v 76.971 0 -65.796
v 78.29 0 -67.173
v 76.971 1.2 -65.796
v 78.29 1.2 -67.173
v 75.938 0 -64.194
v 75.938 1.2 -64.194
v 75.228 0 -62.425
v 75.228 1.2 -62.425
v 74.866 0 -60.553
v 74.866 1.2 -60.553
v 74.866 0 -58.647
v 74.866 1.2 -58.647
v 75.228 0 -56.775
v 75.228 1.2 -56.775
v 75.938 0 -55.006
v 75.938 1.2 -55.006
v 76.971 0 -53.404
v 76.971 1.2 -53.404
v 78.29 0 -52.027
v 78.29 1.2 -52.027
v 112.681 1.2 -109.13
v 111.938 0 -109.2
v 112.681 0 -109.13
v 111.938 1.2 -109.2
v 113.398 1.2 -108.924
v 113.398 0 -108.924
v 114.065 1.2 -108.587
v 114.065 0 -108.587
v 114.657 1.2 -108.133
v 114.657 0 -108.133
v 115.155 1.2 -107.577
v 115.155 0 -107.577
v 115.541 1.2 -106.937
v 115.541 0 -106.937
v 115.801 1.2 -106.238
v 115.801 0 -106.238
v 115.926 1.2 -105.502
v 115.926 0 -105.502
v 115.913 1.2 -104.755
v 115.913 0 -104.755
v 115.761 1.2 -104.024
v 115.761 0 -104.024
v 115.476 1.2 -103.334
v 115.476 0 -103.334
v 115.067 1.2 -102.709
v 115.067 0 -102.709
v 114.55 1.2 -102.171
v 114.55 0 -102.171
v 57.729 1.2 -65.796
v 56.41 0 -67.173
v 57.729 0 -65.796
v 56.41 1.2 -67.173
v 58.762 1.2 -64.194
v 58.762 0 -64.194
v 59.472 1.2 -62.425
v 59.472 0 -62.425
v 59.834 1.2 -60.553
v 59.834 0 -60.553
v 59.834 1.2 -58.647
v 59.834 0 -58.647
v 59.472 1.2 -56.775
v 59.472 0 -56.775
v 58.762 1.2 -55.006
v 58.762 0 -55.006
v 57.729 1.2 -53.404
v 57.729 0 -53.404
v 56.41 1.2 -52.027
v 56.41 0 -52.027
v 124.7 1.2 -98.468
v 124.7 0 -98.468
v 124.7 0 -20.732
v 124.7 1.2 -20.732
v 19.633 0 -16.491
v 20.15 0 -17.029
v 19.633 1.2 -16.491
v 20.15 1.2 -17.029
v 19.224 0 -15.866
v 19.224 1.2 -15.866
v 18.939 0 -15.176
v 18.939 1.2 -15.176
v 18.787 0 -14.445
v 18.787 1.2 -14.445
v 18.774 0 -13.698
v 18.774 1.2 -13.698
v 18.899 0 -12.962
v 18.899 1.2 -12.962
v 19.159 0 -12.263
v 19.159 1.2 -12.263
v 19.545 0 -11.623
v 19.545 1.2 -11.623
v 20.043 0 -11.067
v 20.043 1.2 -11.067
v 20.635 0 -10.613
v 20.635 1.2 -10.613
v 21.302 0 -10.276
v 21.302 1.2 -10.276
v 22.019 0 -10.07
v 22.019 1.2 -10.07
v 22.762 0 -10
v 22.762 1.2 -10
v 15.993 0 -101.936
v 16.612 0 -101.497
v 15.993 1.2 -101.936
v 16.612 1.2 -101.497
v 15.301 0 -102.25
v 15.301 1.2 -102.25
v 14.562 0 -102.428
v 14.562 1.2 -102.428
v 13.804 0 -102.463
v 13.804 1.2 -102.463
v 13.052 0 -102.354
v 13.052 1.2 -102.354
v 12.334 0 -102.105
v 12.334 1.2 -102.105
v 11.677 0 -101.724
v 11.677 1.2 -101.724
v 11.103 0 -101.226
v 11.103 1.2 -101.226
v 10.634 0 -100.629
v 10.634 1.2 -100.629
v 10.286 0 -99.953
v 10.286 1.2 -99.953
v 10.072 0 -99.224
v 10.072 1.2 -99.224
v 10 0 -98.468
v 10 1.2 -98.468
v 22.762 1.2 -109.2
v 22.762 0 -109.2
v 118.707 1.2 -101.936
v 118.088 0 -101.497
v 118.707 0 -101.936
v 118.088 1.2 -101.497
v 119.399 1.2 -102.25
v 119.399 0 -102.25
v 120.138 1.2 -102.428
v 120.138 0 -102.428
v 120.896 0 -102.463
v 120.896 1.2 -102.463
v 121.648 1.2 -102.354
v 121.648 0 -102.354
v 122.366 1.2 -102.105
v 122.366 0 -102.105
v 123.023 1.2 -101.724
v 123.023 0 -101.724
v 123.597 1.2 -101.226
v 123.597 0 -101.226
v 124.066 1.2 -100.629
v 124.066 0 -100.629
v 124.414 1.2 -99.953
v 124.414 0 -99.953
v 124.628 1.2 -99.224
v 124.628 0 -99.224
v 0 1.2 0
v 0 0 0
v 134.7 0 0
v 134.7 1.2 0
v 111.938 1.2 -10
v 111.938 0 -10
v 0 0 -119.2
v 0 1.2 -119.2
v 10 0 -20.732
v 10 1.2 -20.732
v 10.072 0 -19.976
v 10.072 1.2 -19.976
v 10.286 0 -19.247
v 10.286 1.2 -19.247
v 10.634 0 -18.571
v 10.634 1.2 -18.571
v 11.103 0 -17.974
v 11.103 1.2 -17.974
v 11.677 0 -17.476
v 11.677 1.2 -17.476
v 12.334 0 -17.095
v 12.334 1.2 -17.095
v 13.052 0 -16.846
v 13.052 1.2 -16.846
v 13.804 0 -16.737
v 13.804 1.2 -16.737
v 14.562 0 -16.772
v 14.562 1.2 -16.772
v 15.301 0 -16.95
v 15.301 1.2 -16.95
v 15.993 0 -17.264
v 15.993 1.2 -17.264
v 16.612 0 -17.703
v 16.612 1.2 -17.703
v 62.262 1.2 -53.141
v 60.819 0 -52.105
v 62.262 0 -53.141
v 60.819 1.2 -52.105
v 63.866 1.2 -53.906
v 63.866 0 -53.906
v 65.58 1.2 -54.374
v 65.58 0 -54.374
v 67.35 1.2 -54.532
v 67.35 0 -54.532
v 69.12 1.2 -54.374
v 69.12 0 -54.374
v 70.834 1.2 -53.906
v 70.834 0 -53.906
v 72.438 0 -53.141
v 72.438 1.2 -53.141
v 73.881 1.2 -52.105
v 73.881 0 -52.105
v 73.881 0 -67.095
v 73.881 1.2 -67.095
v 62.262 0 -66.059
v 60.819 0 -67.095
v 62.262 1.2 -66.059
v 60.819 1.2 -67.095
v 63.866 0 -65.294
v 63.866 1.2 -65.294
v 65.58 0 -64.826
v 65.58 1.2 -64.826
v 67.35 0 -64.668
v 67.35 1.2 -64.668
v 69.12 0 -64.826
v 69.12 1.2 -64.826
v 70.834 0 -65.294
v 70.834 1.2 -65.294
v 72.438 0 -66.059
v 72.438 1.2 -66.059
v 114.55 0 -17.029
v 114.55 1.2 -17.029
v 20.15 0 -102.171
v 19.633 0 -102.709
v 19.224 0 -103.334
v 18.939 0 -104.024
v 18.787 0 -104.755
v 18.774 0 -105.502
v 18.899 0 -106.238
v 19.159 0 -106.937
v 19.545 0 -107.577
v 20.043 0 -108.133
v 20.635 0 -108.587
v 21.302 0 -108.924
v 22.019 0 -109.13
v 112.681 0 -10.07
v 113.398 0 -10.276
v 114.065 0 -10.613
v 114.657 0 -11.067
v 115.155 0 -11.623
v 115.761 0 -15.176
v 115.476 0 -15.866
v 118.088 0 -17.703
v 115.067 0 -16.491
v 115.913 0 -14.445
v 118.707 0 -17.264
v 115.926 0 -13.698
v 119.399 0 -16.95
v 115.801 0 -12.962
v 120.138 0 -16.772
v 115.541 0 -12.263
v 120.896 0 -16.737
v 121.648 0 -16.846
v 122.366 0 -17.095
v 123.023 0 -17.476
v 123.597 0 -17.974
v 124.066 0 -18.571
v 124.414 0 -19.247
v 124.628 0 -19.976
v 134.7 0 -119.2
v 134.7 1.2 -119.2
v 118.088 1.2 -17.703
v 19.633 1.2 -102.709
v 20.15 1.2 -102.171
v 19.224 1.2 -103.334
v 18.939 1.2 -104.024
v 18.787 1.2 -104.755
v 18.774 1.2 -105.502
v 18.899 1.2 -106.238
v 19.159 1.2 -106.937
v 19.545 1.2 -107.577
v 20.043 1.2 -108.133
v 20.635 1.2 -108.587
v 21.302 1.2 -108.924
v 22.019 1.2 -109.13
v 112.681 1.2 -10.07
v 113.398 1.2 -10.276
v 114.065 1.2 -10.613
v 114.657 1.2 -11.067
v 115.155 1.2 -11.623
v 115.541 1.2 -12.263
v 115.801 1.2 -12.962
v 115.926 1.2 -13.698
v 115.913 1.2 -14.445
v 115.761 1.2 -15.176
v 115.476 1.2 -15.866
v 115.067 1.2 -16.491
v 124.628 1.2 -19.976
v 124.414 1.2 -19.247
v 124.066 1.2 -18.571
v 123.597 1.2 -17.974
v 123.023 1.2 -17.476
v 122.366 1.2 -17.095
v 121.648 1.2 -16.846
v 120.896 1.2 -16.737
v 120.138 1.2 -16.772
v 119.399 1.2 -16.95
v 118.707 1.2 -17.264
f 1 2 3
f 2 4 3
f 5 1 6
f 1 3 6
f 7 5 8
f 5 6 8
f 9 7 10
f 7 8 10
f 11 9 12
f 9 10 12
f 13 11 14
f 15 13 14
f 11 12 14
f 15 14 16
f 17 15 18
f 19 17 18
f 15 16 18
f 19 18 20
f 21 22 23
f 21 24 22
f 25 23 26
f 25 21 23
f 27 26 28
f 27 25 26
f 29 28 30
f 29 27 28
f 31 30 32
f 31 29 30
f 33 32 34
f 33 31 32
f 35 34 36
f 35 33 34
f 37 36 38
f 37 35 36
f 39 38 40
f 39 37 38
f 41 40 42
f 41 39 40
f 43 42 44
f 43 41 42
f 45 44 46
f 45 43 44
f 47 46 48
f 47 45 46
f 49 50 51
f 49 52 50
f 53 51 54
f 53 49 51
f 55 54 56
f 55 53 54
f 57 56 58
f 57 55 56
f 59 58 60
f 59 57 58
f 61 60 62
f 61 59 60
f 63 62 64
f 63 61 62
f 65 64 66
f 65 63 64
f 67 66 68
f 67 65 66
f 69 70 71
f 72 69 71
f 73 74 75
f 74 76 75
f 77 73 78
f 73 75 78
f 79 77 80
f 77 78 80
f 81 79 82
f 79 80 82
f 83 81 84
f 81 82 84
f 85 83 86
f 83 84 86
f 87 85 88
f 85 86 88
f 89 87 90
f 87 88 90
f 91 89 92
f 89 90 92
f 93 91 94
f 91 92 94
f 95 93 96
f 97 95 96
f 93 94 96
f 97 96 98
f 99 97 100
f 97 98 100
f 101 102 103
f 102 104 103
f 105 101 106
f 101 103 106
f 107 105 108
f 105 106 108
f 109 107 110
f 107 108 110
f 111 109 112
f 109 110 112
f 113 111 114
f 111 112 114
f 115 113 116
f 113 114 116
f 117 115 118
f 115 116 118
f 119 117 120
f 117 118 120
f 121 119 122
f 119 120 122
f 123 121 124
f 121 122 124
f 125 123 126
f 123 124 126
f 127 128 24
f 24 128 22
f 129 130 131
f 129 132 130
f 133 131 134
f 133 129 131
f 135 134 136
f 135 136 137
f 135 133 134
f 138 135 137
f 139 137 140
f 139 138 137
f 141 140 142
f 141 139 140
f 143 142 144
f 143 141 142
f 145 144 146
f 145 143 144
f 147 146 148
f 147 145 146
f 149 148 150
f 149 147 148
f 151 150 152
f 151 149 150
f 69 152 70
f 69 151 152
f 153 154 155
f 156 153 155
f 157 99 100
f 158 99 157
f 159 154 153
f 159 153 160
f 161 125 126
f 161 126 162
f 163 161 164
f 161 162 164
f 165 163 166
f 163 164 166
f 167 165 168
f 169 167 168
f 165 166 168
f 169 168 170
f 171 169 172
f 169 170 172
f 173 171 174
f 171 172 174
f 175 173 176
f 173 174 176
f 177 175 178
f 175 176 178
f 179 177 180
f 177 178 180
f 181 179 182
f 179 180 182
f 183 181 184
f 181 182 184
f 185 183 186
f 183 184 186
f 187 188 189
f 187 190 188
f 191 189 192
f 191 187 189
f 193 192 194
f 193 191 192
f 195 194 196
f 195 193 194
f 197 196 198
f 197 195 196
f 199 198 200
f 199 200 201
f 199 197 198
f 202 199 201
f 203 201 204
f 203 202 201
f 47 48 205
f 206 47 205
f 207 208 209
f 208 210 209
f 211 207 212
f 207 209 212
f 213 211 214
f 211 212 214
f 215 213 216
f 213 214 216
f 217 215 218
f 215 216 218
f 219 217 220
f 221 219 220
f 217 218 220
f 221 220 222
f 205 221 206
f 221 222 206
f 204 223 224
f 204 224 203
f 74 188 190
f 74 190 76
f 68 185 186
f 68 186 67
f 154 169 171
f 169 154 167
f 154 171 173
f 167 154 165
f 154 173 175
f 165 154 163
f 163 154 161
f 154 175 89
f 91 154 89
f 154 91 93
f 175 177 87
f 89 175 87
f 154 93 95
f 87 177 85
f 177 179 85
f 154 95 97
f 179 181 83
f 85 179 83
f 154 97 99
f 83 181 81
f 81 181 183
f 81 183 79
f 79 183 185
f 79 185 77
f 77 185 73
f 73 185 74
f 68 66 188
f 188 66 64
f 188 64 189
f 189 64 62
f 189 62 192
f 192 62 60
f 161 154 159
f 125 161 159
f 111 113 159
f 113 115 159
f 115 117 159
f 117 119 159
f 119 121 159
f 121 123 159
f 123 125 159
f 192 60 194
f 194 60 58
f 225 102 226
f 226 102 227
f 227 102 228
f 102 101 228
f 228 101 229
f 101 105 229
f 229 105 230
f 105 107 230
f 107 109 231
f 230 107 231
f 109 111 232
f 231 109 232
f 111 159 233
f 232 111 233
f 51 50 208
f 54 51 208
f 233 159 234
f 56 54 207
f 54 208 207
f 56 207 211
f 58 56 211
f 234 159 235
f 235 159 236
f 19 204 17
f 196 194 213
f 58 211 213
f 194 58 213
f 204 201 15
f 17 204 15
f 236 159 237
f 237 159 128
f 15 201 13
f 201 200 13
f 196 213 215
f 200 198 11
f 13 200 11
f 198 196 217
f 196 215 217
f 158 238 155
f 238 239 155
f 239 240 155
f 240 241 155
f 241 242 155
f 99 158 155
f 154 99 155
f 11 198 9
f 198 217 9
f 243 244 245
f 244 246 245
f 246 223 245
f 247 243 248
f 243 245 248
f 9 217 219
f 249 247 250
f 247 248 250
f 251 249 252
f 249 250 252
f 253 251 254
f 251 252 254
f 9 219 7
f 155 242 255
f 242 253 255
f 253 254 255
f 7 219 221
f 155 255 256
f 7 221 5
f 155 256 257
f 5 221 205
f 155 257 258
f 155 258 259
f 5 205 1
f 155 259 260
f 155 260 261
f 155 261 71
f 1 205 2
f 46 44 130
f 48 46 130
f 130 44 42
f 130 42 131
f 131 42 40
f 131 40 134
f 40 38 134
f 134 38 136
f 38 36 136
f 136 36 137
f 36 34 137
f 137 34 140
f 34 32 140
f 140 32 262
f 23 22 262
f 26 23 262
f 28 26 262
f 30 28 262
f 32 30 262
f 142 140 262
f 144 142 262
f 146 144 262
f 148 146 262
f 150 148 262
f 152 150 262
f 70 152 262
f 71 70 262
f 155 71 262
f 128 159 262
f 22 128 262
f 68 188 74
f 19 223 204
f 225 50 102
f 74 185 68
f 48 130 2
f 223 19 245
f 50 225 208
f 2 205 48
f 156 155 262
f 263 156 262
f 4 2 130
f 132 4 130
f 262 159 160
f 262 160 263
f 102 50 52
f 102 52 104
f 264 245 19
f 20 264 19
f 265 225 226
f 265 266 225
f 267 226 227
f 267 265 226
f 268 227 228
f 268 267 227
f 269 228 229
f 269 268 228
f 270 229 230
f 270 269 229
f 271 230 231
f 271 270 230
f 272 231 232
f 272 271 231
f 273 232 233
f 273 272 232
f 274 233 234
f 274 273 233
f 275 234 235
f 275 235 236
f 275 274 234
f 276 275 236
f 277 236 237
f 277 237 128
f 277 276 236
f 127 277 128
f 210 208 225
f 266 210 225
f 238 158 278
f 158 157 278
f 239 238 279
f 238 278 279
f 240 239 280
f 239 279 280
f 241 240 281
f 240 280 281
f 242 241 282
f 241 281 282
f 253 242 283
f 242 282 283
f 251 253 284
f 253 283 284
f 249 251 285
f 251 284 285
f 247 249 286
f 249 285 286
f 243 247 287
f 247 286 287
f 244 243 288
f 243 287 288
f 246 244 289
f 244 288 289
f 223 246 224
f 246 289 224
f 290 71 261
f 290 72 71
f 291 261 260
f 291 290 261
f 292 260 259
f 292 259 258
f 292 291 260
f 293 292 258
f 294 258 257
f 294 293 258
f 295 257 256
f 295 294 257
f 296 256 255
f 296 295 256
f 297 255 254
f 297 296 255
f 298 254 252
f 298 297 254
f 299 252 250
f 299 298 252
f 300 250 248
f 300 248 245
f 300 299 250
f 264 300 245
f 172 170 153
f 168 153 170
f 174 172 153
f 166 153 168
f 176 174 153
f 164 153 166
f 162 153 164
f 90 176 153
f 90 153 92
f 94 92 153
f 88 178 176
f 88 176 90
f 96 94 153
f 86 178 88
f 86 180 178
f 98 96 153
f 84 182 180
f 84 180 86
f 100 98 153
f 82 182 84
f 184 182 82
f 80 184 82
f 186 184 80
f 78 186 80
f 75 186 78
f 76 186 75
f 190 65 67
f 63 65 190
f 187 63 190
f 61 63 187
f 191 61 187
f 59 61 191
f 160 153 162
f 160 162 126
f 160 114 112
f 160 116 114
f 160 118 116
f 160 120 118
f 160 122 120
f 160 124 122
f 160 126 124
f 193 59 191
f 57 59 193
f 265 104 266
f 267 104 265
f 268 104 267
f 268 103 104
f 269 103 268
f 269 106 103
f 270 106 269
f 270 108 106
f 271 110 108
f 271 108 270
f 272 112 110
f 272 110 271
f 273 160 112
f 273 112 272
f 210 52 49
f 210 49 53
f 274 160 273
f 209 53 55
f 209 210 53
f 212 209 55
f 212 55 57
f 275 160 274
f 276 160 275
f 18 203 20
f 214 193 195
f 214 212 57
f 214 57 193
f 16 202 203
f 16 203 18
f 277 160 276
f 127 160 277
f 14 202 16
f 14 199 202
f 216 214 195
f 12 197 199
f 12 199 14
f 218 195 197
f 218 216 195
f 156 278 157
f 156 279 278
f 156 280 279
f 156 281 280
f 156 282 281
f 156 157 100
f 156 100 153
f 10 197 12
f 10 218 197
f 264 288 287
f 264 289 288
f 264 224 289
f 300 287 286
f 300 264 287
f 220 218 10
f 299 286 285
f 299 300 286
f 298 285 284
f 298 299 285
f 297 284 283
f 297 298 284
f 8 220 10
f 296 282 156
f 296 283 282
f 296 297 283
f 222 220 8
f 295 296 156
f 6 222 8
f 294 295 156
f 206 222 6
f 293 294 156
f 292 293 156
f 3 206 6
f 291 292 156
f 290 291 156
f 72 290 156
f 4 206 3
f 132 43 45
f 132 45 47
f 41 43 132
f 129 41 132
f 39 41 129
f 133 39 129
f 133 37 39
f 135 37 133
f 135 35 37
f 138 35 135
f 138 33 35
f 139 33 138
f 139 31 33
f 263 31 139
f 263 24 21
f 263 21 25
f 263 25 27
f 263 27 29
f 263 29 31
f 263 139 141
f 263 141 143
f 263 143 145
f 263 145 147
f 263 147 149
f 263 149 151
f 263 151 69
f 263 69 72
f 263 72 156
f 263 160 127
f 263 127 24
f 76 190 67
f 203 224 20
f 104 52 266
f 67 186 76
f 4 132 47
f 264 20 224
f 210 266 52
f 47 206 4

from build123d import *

# Parameters (mm, degrees)
SKETCH1_W           = 134.7
SKETCH1_H           = 119.2
BOSS_EXTRUDE1_DEPTH = 1.2
FILLET1_R           = 10
FILLET2_R           = 4


with BuildPart() as part:
    # Sketch1 → Boss-Extrude1 (new body)
    with BuildSketch(Plane(origin=(0, 0, 0), x_dir=(1, 0, 0), z_dir=(0, 1, 0))):
        with Locations((67.35, 59.6)):
            Rectangle(SKETCH1_W, SKETCH1_H)
        Polygon((122.7, 109.2), (67.35, 61.462466726), (12, 109.2), align=None, mode=Mode.SUBTRACT)
        Polygon((10, 107.2), (10, 12), (65.190534979, 59.6), align=None, mode=Mode.SUBTRACT)
        Polygon((12, 10), (122.7, 10), (67.35, 57.737533274), align=None, mode=Mode.SUBTRACT)
        Polygon((124.7, 107.2), (124.7, 12), (69.509465021, 59.6), align=None, mode=Mode.SUBTRACT)
    extrude(amount=BOSS_EXTRUDE1_DEPTH)

    # Fillet1
    fillet1_edges = [part.edges().sort_by_distance(p)[0] for p in [
        (67.35, 0.6, -61.462466726),
        (65.190534979, 0.6, -59.6),
        (67.35, 0.6, -57.737533274),
        (69.509465021, 0.6, -59.6),
    ]]
    fillet(fillet1_edges, radius=FILLET1_R)

    # Fillet2
    fillet2_edges = [part.edges().sort_by_distance(p)[0] for p in [
        (12, 0.6, -109.2),
        (122.7, 0.6, -109.2),
        (10, 0.6, -107.2),
        (10, 0.6, -12),
        (122.7, 0.6, -10),
        (12, 0.6, -10),
        (124.7, 0.6, -107.2),
        (124.7, 0.6, -12),
    ]]
    fillet(fillet2_edges, radius=FILLET2_R)


solid = part.part
